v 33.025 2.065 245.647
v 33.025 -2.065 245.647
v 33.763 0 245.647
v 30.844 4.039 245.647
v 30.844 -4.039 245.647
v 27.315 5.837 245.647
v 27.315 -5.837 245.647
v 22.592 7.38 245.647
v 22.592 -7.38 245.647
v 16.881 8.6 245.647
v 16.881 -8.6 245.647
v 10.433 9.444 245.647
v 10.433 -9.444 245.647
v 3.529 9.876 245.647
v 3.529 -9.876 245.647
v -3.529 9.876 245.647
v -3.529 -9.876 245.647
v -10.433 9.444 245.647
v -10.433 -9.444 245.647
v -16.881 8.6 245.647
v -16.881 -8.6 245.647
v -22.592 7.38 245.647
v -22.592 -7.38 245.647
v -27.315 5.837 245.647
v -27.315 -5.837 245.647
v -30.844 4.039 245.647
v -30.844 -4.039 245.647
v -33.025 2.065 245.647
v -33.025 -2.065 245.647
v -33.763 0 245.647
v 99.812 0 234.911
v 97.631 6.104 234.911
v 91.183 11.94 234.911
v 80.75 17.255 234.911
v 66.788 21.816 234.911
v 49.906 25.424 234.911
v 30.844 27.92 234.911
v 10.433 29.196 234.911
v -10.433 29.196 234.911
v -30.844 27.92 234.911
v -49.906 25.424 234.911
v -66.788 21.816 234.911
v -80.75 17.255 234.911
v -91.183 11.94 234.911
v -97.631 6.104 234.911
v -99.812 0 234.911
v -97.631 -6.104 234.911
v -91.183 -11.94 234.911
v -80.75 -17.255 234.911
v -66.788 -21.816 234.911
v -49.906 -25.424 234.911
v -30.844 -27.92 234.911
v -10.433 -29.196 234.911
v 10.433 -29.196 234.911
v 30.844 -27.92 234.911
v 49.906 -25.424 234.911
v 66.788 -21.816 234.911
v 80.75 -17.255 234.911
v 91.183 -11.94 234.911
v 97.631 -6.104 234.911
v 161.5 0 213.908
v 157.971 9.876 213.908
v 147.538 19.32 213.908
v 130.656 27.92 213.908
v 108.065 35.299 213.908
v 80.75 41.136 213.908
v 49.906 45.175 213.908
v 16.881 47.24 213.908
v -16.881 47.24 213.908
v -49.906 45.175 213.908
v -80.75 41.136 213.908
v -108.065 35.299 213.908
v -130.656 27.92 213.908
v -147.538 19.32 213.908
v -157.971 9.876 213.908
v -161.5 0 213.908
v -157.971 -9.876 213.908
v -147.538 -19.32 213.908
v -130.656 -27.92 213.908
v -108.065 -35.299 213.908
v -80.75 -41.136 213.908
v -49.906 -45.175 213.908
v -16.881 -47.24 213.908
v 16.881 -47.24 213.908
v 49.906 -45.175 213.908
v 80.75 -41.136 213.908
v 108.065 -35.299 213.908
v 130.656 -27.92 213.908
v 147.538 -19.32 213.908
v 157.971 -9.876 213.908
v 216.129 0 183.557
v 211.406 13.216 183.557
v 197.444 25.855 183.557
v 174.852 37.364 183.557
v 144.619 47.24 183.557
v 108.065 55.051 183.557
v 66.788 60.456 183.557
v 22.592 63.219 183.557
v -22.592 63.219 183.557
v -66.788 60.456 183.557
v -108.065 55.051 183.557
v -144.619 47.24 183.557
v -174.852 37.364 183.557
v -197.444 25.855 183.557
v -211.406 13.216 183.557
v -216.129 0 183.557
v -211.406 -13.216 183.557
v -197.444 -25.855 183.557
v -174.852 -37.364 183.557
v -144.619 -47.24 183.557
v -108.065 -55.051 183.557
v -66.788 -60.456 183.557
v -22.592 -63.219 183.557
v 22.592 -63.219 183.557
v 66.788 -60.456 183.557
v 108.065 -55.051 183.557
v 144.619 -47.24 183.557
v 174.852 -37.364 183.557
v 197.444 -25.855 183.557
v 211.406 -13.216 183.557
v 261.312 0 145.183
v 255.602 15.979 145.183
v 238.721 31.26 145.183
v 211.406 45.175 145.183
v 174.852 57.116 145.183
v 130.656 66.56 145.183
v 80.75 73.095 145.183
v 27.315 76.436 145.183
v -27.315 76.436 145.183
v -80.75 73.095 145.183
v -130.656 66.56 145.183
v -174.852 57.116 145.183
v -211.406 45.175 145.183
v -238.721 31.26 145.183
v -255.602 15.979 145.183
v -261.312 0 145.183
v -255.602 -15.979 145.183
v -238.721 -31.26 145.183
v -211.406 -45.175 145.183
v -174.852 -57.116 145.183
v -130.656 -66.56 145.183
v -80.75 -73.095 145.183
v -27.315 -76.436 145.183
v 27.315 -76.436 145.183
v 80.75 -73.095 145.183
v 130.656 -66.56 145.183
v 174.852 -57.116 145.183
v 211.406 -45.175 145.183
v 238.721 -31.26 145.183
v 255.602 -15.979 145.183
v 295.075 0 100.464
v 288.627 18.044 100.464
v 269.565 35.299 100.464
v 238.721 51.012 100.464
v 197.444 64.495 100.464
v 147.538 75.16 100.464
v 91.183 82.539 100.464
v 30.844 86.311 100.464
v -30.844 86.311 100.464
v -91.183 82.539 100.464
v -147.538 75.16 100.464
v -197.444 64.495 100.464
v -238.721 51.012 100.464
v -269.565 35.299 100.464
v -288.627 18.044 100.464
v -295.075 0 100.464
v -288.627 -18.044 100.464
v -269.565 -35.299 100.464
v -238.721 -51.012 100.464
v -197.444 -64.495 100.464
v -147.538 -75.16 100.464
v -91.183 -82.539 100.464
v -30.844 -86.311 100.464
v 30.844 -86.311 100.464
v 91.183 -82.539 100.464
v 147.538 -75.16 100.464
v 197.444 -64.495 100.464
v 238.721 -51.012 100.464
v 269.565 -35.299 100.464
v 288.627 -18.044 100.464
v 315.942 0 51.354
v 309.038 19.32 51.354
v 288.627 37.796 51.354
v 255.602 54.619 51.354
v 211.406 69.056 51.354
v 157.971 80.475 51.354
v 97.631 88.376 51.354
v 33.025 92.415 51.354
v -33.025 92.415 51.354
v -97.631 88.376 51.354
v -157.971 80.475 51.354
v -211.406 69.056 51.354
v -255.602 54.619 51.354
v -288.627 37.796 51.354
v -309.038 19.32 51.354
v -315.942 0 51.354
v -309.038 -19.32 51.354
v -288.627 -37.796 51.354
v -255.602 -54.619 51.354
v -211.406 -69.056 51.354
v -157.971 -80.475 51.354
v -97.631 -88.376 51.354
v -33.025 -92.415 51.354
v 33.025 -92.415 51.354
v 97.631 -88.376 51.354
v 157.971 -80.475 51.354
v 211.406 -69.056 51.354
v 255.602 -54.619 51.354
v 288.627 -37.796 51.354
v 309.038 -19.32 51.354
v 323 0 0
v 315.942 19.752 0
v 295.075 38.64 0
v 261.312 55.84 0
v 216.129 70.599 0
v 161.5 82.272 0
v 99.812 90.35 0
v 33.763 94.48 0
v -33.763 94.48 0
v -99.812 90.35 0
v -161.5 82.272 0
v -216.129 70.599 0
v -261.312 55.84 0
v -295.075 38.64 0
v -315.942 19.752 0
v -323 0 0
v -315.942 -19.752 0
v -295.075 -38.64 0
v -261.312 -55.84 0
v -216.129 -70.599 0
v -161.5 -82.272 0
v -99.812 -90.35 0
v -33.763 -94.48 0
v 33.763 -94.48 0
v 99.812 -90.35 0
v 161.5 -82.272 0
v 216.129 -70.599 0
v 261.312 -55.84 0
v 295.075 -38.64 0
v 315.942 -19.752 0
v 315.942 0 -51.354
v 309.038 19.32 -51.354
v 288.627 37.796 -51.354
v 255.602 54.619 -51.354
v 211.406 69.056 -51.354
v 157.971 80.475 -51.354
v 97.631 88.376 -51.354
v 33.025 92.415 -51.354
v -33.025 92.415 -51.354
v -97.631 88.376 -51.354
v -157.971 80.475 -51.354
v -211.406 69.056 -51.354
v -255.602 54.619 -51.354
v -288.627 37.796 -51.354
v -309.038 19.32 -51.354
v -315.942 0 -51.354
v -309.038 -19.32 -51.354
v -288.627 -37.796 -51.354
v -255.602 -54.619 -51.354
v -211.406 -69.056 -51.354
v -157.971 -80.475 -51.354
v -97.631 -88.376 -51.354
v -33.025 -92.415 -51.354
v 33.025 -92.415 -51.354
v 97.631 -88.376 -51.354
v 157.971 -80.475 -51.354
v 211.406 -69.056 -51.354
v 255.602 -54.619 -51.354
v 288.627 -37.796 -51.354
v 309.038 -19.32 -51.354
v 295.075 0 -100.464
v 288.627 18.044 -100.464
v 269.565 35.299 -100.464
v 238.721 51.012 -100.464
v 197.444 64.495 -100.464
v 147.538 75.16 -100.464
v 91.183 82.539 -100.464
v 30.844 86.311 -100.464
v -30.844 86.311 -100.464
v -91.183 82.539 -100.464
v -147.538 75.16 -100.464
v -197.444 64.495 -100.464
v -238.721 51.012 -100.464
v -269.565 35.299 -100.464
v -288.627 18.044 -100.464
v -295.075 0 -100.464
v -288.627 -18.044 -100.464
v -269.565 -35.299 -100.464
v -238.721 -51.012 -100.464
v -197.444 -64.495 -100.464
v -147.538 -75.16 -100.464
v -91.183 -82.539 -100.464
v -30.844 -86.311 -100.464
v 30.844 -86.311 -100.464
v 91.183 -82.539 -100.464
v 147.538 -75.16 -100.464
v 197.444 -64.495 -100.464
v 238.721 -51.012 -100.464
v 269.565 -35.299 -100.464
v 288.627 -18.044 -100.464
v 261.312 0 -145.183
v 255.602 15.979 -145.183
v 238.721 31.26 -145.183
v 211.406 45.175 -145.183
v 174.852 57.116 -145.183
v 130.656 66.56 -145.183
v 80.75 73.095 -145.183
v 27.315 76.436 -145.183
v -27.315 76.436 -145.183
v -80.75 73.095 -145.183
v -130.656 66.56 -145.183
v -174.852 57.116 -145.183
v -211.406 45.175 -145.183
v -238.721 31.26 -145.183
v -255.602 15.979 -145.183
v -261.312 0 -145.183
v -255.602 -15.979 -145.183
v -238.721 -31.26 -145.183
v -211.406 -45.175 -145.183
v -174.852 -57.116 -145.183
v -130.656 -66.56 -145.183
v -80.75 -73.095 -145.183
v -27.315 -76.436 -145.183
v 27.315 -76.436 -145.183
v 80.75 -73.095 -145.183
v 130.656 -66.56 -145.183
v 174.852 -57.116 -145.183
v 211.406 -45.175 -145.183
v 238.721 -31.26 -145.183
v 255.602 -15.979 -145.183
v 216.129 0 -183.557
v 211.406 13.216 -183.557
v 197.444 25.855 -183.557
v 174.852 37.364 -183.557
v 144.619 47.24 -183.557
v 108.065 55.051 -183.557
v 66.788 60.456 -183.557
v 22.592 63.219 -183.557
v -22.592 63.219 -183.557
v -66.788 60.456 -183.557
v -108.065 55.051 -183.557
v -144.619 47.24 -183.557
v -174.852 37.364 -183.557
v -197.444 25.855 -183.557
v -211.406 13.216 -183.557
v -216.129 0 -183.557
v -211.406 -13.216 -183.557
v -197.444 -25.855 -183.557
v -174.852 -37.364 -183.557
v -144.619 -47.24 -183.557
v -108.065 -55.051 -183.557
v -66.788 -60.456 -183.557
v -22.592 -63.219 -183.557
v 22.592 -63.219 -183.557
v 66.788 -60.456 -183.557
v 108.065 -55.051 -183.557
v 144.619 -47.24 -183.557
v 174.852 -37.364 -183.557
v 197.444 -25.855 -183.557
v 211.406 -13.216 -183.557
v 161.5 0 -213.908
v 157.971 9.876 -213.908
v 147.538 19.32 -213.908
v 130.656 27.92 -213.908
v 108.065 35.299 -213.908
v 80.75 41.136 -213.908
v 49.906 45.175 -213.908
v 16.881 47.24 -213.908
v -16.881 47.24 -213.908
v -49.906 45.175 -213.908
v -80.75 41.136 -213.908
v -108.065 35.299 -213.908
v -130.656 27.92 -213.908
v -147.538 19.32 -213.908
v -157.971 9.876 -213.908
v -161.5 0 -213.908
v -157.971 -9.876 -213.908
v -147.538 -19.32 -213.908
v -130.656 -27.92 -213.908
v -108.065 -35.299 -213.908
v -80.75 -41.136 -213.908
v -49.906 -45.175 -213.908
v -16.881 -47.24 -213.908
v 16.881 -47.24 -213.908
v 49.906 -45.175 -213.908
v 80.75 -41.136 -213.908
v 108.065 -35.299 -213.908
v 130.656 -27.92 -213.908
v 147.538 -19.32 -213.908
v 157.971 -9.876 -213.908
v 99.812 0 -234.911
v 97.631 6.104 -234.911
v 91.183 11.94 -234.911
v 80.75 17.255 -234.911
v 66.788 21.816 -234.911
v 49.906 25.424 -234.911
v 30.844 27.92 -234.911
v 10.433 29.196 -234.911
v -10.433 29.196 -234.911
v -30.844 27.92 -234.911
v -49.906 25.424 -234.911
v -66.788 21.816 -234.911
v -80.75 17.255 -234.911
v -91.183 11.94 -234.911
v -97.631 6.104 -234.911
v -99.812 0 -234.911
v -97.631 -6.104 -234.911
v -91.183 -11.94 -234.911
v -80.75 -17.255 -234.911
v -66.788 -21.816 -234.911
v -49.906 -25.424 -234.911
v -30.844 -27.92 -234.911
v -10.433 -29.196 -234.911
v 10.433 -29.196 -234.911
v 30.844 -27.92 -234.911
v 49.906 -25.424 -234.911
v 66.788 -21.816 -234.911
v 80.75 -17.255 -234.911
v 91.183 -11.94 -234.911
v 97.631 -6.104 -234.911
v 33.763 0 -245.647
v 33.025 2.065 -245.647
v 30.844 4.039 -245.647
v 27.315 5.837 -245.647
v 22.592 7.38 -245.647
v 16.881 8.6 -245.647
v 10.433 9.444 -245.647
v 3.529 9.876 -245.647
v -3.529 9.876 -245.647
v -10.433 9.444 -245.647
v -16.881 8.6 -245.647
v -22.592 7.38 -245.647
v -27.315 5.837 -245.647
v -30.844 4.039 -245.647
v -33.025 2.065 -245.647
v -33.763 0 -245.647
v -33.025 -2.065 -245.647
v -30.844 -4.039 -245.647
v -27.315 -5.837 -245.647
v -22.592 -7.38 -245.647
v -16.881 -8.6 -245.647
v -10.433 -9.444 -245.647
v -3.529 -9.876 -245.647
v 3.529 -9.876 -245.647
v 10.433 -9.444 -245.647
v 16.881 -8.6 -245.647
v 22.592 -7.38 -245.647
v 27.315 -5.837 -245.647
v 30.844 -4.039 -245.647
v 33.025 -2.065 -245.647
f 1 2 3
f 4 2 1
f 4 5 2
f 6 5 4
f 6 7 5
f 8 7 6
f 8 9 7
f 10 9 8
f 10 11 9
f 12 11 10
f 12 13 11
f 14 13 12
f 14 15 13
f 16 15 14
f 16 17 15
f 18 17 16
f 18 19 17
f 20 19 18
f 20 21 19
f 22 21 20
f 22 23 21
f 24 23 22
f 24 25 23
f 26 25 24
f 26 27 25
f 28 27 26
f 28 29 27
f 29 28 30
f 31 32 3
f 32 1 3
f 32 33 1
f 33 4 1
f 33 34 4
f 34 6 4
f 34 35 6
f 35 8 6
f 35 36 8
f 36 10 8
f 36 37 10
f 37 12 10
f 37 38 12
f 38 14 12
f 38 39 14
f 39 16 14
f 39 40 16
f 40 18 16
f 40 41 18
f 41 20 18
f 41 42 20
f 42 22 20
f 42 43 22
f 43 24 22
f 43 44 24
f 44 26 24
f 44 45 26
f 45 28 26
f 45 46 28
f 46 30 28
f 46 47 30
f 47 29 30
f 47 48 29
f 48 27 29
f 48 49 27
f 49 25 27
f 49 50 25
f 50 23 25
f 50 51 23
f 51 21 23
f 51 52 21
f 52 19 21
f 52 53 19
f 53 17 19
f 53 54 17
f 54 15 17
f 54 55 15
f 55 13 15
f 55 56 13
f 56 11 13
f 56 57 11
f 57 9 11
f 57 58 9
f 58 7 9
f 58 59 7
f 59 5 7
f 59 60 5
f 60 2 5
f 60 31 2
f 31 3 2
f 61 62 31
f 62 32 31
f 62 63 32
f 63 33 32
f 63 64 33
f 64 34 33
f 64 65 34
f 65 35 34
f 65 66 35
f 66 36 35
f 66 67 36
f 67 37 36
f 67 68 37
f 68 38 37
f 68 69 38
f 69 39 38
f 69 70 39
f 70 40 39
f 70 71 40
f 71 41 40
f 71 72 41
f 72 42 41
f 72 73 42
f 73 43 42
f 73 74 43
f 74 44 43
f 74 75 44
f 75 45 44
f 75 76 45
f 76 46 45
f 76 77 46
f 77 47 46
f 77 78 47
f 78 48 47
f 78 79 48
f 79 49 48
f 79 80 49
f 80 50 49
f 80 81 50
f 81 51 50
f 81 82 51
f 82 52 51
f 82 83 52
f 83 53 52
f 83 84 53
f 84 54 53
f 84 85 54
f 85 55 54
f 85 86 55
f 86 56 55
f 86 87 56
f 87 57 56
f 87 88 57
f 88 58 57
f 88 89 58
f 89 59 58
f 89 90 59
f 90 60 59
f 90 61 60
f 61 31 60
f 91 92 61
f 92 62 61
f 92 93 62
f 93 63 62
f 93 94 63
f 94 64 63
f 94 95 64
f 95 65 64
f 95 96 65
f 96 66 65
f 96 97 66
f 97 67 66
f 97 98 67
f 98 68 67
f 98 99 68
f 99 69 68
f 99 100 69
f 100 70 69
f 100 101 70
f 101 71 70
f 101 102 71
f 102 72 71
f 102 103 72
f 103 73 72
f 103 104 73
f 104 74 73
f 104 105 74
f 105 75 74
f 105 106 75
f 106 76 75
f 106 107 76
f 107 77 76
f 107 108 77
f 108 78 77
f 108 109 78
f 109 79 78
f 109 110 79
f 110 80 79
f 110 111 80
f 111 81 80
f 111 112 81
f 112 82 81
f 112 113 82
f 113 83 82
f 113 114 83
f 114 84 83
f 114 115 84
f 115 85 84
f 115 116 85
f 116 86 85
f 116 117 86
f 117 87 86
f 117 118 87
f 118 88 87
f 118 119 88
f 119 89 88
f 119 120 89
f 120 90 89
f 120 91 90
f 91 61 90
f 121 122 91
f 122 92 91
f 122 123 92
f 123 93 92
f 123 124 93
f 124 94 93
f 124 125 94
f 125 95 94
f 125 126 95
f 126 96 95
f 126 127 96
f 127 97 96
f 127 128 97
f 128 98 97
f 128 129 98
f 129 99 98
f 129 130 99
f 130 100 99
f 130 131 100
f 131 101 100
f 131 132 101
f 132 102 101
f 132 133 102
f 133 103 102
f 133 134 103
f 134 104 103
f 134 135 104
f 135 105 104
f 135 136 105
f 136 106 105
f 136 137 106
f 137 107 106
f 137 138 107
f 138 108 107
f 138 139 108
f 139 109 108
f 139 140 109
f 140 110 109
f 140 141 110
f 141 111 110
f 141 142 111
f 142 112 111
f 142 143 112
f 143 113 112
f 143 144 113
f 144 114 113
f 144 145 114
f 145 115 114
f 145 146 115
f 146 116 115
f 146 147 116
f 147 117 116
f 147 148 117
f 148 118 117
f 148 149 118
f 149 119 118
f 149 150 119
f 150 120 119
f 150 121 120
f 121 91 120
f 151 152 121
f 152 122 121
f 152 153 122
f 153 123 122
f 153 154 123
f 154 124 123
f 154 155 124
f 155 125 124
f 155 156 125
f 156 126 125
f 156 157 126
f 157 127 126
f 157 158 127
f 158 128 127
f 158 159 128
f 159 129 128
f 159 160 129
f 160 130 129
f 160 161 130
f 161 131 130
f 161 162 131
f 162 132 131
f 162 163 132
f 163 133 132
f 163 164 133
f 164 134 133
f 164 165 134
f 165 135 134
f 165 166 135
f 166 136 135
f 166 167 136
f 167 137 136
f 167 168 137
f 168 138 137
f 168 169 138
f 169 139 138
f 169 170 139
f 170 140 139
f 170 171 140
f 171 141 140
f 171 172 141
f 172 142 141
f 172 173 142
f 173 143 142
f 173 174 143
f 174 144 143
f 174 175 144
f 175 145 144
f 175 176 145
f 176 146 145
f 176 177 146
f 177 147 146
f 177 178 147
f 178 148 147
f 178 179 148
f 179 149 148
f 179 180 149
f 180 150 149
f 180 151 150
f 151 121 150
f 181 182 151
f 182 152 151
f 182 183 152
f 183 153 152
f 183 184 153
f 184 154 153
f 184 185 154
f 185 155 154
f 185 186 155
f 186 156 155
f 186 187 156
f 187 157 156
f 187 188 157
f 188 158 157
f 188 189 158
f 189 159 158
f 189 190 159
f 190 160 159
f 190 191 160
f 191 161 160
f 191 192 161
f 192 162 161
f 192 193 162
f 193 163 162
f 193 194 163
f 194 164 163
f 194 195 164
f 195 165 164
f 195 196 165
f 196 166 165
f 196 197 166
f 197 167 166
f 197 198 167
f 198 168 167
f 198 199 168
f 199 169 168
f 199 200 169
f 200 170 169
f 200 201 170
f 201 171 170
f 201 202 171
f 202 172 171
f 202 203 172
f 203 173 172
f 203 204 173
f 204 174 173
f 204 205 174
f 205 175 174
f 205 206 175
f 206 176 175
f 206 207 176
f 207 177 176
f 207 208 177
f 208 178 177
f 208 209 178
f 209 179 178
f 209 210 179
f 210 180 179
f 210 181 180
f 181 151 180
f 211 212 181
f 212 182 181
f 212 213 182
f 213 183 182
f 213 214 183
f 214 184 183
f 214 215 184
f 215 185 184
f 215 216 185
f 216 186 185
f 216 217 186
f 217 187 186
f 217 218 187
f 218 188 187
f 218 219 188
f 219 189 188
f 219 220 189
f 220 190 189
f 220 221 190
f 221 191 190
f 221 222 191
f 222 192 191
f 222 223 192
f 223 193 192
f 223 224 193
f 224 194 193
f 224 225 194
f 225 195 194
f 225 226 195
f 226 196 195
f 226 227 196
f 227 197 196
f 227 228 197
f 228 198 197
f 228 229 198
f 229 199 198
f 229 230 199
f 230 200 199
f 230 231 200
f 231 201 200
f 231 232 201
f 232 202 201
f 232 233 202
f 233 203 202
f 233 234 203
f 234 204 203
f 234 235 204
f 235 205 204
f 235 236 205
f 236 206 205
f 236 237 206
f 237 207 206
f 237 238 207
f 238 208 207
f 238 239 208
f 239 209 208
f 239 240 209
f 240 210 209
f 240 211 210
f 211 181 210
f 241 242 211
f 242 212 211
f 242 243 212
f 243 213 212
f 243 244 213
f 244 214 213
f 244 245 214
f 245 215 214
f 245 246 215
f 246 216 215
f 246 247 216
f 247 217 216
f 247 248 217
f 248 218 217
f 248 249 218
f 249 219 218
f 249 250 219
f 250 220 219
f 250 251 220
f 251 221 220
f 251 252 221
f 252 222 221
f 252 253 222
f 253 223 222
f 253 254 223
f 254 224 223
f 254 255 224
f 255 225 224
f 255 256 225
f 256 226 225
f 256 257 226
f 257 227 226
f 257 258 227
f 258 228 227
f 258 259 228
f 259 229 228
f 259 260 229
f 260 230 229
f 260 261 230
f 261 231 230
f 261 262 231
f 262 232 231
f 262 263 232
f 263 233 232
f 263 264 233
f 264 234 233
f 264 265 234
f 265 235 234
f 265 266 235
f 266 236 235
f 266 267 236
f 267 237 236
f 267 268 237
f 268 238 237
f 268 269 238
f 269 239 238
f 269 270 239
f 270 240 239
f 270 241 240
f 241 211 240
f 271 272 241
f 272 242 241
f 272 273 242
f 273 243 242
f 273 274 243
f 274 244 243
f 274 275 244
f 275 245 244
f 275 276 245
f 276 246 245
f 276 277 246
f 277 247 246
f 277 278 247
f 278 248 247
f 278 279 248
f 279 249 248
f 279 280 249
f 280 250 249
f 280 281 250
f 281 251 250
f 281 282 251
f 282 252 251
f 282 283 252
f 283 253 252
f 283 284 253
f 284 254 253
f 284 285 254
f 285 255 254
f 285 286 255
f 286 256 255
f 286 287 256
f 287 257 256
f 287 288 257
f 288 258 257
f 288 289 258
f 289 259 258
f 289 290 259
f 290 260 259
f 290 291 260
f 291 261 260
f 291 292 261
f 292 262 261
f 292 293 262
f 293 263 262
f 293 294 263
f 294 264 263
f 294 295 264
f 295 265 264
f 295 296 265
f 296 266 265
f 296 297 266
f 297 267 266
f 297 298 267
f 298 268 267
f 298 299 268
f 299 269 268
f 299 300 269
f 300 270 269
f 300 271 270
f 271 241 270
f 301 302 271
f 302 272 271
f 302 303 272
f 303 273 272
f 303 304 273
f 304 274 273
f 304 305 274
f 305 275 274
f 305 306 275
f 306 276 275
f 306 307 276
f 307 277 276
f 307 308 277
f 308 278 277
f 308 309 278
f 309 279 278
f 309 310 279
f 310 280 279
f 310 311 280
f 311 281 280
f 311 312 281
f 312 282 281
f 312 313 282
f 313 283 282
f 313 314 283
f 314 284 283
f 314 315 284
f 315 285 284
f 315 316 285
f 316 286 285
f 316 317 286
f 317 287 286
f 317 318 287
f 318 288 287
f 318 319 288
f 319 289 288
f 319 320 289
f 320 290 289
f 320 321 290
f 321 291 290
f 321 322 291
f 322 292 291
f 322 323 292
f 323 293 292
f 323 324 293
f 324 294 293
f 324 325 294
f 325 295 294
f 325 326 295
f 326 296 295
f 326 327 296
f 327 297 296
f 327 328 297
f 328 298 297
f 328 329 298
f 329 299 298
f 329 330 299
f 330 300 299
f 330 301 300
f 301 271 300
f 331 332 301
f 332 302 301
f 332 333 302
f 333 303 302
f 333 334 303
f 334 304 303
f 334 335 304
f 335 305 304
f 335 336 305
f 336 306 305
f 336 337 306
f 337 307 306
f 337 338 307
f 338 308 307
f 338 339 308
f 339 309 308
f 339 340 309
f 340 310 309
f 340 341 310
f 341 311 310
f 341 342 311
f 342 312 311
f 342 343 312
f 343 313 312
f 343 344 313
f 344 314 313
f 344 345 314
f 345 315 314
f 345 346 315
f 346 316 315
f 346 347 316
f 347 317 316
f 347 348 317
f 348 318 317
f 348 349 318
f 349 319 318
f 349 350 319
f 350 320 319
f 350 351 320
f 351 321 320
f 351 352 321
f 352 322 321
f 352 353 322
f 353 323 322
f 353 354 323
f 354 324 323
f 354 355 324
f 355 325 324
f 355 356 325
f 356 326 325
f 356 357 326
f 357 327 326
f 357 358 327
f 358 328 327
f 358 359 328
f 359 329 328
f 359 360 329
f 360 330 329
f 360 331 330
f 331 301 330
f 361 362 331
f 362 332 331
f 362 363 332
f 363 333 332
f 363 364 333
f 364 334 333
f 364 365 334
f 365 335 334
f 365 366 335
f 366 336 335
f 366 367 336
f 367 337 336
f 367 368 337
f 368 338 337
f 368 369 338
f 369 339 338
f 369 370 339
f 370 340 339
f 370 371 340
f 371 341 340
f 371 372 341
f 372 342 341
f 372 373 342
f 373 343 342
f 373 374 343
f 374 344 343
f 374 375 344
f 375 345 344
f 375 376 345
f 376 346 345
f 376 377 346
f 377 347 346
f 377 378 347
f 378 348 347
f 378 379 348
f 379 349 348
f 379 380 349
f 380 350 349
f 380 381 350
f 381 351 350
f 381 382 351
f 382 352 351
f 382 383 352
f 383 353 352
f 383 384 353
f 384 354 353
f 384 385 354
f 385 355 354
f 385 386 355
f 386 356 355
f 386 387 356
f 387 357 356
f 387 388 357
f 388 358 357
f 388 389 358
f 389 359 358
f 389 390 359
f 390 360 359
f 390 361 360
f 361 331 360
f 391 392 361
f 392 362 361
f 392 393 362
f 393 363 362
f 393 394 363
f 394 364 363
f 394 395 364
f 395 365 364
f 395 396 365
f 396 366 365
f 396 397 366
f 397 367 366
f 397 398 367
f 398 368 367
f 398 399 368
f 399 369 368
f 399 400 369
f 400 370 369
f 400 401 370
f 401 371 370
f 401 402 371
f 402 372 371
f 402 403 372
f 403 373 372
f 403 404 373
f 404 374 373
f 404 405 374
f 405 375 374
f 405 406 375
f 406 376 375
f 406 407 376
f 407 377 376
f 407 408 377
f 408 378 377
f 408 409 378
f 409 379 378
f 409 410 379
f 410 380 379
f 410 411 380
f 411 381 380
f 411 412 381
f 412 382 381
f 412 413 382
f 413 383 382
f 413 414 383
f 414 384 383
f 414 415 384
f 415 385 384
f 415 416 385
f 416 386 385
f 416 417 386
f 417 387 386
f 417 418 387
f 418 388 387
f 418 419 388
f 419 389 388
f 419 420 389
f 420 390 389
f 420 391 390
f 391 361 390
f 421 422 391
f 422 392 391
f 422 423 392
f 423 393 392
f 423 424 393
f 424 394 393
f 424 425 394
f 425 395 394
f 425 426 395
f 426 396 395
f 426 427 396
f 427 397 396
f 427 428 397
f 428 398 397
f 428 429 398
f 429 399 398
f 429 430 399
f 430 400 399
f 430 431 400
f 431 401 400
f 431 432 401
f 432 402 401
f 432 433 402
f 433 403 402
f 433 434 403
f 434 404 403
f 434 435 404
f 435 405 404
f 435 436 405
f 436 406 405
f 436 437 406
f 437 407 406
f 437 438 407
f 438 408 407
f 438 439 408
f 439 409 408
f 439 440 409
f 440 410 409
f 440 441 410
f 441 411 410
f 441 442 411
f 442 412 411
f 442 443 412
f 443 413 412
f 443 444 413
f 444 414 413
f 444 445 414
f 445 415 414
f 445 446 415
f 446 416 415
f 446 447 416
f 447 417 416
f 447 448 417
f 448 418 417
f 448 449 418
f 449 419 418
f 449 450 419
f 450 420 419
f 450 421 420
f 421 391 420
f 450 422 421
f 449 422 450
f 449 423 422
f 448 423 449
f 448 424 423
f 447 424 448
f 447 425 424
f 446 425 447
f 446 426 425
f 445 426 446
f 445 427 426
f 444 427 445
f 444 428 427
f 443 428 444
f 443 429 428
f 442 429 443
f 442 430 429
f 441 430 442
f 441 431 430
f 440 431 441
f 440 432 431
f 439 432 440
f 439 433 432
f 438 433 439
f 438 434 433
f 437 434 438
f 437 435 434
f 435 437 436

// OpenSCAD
// Generated by SolidPython 1.0.1 on 2020-07-29 00:46:52


scale(v = [17, 5, 13]) {
	sphere(r = 19);
}
/***********************************************
*********      SolidPython code:      **********
************************************************
 
# import packages: SolidPython
from solid import *
from solid.utils import *
from itertools import chain, combinations, permutations


class Resize:

    def __init__(self, scad_file):
        self.scad_file = scad_file
        #self.scad_file = import_scad(scad_file)
        # cone/cylinder param:
        self.r1 = 0
        self.r2 = 0
        self.h = 0
        # rectangular prism param:
        self.w = 0
        self.l = 0
        # ellipse param:
        self.r = 0

    # import OpenScad code (file name corresponds to shape)


    # classify shape + parameters
    def assign(self, param1, param2, param3):
        if self.scad_file == 'cone.scad':
            self.r1 = param1
            self.r2 = param2
            self.h = param3
        elif self.scad_file == 'cylinder.scad':
            self.r1 = param1
            self.r2 = param2
            self.h = param3
        elif self.scad_file == 'rectangularPrism.scad':
            self.h = param1
            self.l = param2
            self.w = param3
        else:
            self.r = param1
            self.h = param2

    # resize parameters
    def iterate(self):
        x = range(3, 20, 2)
        i = 1
        if self.scad_file == 'cone.scad':
            tempList = list(permutations(x, 2))
            for temp in tempList:
                param1 = temp[0]
                param2 = temp[1]
                filepath = 'produced_scad_files/' + 'cone' + str(param1) + '_' + str(param2) + '_' + '.scad'
                scad_render_to_file(cylinder(h=param1, r1=param2, r2=0), filepath)

        elif self.scad_file == 'cylinder.scad':
            tempList = list(permutations(x, 3))
            for temp in tempList:
                param1 = temp[0]
                param2 = temp[1]
                filepath = 'produced_scad_files/' + 'cylinder' + str(param1) + '_' + str(param2) + '_' + '.scad'
                scad_render_to_file(cylinder(h=param1, r1=param2, r2=param2), filepath)

        elif self.scad_file == 'rectangularPrism.scad':
            tempList = list(permutations(x, 3))
            for temp in tempList:
                param1 = temp[0]
                param2 = temp[1]
                param3 = temp[2]
                filepath = 'produced_scad_files/' + 'rectangularPrism' + str(param1) + '_' + str(param2) + '_' + str(
                    param3) + '.scad'
                scad_render_to_file(cube(size=(param1, param2, param3)), filepath)

        elif self.scad_file == 'ellipse.scad':
            tempList = list(permutations(x, 4))
            for temp in tempList:
                param1 = temp[0]
                param2 = temp[1]
                param3 = temp[2]
                param4 = temp[3]
                filepath = 'produced_scad_files/' + 'ellipse' + str(param1) + '_' + str(param2) + '_' + str(param3) + '_' + str(param4) + '.scad'
                scad_render_to_file(scale([param1, param2, param3])(sphere(r=param4)), filepath)

    def render_to_scadfile(self):
        scad_render_to_file(scad, 'example.scad') 
 
************************************************/
